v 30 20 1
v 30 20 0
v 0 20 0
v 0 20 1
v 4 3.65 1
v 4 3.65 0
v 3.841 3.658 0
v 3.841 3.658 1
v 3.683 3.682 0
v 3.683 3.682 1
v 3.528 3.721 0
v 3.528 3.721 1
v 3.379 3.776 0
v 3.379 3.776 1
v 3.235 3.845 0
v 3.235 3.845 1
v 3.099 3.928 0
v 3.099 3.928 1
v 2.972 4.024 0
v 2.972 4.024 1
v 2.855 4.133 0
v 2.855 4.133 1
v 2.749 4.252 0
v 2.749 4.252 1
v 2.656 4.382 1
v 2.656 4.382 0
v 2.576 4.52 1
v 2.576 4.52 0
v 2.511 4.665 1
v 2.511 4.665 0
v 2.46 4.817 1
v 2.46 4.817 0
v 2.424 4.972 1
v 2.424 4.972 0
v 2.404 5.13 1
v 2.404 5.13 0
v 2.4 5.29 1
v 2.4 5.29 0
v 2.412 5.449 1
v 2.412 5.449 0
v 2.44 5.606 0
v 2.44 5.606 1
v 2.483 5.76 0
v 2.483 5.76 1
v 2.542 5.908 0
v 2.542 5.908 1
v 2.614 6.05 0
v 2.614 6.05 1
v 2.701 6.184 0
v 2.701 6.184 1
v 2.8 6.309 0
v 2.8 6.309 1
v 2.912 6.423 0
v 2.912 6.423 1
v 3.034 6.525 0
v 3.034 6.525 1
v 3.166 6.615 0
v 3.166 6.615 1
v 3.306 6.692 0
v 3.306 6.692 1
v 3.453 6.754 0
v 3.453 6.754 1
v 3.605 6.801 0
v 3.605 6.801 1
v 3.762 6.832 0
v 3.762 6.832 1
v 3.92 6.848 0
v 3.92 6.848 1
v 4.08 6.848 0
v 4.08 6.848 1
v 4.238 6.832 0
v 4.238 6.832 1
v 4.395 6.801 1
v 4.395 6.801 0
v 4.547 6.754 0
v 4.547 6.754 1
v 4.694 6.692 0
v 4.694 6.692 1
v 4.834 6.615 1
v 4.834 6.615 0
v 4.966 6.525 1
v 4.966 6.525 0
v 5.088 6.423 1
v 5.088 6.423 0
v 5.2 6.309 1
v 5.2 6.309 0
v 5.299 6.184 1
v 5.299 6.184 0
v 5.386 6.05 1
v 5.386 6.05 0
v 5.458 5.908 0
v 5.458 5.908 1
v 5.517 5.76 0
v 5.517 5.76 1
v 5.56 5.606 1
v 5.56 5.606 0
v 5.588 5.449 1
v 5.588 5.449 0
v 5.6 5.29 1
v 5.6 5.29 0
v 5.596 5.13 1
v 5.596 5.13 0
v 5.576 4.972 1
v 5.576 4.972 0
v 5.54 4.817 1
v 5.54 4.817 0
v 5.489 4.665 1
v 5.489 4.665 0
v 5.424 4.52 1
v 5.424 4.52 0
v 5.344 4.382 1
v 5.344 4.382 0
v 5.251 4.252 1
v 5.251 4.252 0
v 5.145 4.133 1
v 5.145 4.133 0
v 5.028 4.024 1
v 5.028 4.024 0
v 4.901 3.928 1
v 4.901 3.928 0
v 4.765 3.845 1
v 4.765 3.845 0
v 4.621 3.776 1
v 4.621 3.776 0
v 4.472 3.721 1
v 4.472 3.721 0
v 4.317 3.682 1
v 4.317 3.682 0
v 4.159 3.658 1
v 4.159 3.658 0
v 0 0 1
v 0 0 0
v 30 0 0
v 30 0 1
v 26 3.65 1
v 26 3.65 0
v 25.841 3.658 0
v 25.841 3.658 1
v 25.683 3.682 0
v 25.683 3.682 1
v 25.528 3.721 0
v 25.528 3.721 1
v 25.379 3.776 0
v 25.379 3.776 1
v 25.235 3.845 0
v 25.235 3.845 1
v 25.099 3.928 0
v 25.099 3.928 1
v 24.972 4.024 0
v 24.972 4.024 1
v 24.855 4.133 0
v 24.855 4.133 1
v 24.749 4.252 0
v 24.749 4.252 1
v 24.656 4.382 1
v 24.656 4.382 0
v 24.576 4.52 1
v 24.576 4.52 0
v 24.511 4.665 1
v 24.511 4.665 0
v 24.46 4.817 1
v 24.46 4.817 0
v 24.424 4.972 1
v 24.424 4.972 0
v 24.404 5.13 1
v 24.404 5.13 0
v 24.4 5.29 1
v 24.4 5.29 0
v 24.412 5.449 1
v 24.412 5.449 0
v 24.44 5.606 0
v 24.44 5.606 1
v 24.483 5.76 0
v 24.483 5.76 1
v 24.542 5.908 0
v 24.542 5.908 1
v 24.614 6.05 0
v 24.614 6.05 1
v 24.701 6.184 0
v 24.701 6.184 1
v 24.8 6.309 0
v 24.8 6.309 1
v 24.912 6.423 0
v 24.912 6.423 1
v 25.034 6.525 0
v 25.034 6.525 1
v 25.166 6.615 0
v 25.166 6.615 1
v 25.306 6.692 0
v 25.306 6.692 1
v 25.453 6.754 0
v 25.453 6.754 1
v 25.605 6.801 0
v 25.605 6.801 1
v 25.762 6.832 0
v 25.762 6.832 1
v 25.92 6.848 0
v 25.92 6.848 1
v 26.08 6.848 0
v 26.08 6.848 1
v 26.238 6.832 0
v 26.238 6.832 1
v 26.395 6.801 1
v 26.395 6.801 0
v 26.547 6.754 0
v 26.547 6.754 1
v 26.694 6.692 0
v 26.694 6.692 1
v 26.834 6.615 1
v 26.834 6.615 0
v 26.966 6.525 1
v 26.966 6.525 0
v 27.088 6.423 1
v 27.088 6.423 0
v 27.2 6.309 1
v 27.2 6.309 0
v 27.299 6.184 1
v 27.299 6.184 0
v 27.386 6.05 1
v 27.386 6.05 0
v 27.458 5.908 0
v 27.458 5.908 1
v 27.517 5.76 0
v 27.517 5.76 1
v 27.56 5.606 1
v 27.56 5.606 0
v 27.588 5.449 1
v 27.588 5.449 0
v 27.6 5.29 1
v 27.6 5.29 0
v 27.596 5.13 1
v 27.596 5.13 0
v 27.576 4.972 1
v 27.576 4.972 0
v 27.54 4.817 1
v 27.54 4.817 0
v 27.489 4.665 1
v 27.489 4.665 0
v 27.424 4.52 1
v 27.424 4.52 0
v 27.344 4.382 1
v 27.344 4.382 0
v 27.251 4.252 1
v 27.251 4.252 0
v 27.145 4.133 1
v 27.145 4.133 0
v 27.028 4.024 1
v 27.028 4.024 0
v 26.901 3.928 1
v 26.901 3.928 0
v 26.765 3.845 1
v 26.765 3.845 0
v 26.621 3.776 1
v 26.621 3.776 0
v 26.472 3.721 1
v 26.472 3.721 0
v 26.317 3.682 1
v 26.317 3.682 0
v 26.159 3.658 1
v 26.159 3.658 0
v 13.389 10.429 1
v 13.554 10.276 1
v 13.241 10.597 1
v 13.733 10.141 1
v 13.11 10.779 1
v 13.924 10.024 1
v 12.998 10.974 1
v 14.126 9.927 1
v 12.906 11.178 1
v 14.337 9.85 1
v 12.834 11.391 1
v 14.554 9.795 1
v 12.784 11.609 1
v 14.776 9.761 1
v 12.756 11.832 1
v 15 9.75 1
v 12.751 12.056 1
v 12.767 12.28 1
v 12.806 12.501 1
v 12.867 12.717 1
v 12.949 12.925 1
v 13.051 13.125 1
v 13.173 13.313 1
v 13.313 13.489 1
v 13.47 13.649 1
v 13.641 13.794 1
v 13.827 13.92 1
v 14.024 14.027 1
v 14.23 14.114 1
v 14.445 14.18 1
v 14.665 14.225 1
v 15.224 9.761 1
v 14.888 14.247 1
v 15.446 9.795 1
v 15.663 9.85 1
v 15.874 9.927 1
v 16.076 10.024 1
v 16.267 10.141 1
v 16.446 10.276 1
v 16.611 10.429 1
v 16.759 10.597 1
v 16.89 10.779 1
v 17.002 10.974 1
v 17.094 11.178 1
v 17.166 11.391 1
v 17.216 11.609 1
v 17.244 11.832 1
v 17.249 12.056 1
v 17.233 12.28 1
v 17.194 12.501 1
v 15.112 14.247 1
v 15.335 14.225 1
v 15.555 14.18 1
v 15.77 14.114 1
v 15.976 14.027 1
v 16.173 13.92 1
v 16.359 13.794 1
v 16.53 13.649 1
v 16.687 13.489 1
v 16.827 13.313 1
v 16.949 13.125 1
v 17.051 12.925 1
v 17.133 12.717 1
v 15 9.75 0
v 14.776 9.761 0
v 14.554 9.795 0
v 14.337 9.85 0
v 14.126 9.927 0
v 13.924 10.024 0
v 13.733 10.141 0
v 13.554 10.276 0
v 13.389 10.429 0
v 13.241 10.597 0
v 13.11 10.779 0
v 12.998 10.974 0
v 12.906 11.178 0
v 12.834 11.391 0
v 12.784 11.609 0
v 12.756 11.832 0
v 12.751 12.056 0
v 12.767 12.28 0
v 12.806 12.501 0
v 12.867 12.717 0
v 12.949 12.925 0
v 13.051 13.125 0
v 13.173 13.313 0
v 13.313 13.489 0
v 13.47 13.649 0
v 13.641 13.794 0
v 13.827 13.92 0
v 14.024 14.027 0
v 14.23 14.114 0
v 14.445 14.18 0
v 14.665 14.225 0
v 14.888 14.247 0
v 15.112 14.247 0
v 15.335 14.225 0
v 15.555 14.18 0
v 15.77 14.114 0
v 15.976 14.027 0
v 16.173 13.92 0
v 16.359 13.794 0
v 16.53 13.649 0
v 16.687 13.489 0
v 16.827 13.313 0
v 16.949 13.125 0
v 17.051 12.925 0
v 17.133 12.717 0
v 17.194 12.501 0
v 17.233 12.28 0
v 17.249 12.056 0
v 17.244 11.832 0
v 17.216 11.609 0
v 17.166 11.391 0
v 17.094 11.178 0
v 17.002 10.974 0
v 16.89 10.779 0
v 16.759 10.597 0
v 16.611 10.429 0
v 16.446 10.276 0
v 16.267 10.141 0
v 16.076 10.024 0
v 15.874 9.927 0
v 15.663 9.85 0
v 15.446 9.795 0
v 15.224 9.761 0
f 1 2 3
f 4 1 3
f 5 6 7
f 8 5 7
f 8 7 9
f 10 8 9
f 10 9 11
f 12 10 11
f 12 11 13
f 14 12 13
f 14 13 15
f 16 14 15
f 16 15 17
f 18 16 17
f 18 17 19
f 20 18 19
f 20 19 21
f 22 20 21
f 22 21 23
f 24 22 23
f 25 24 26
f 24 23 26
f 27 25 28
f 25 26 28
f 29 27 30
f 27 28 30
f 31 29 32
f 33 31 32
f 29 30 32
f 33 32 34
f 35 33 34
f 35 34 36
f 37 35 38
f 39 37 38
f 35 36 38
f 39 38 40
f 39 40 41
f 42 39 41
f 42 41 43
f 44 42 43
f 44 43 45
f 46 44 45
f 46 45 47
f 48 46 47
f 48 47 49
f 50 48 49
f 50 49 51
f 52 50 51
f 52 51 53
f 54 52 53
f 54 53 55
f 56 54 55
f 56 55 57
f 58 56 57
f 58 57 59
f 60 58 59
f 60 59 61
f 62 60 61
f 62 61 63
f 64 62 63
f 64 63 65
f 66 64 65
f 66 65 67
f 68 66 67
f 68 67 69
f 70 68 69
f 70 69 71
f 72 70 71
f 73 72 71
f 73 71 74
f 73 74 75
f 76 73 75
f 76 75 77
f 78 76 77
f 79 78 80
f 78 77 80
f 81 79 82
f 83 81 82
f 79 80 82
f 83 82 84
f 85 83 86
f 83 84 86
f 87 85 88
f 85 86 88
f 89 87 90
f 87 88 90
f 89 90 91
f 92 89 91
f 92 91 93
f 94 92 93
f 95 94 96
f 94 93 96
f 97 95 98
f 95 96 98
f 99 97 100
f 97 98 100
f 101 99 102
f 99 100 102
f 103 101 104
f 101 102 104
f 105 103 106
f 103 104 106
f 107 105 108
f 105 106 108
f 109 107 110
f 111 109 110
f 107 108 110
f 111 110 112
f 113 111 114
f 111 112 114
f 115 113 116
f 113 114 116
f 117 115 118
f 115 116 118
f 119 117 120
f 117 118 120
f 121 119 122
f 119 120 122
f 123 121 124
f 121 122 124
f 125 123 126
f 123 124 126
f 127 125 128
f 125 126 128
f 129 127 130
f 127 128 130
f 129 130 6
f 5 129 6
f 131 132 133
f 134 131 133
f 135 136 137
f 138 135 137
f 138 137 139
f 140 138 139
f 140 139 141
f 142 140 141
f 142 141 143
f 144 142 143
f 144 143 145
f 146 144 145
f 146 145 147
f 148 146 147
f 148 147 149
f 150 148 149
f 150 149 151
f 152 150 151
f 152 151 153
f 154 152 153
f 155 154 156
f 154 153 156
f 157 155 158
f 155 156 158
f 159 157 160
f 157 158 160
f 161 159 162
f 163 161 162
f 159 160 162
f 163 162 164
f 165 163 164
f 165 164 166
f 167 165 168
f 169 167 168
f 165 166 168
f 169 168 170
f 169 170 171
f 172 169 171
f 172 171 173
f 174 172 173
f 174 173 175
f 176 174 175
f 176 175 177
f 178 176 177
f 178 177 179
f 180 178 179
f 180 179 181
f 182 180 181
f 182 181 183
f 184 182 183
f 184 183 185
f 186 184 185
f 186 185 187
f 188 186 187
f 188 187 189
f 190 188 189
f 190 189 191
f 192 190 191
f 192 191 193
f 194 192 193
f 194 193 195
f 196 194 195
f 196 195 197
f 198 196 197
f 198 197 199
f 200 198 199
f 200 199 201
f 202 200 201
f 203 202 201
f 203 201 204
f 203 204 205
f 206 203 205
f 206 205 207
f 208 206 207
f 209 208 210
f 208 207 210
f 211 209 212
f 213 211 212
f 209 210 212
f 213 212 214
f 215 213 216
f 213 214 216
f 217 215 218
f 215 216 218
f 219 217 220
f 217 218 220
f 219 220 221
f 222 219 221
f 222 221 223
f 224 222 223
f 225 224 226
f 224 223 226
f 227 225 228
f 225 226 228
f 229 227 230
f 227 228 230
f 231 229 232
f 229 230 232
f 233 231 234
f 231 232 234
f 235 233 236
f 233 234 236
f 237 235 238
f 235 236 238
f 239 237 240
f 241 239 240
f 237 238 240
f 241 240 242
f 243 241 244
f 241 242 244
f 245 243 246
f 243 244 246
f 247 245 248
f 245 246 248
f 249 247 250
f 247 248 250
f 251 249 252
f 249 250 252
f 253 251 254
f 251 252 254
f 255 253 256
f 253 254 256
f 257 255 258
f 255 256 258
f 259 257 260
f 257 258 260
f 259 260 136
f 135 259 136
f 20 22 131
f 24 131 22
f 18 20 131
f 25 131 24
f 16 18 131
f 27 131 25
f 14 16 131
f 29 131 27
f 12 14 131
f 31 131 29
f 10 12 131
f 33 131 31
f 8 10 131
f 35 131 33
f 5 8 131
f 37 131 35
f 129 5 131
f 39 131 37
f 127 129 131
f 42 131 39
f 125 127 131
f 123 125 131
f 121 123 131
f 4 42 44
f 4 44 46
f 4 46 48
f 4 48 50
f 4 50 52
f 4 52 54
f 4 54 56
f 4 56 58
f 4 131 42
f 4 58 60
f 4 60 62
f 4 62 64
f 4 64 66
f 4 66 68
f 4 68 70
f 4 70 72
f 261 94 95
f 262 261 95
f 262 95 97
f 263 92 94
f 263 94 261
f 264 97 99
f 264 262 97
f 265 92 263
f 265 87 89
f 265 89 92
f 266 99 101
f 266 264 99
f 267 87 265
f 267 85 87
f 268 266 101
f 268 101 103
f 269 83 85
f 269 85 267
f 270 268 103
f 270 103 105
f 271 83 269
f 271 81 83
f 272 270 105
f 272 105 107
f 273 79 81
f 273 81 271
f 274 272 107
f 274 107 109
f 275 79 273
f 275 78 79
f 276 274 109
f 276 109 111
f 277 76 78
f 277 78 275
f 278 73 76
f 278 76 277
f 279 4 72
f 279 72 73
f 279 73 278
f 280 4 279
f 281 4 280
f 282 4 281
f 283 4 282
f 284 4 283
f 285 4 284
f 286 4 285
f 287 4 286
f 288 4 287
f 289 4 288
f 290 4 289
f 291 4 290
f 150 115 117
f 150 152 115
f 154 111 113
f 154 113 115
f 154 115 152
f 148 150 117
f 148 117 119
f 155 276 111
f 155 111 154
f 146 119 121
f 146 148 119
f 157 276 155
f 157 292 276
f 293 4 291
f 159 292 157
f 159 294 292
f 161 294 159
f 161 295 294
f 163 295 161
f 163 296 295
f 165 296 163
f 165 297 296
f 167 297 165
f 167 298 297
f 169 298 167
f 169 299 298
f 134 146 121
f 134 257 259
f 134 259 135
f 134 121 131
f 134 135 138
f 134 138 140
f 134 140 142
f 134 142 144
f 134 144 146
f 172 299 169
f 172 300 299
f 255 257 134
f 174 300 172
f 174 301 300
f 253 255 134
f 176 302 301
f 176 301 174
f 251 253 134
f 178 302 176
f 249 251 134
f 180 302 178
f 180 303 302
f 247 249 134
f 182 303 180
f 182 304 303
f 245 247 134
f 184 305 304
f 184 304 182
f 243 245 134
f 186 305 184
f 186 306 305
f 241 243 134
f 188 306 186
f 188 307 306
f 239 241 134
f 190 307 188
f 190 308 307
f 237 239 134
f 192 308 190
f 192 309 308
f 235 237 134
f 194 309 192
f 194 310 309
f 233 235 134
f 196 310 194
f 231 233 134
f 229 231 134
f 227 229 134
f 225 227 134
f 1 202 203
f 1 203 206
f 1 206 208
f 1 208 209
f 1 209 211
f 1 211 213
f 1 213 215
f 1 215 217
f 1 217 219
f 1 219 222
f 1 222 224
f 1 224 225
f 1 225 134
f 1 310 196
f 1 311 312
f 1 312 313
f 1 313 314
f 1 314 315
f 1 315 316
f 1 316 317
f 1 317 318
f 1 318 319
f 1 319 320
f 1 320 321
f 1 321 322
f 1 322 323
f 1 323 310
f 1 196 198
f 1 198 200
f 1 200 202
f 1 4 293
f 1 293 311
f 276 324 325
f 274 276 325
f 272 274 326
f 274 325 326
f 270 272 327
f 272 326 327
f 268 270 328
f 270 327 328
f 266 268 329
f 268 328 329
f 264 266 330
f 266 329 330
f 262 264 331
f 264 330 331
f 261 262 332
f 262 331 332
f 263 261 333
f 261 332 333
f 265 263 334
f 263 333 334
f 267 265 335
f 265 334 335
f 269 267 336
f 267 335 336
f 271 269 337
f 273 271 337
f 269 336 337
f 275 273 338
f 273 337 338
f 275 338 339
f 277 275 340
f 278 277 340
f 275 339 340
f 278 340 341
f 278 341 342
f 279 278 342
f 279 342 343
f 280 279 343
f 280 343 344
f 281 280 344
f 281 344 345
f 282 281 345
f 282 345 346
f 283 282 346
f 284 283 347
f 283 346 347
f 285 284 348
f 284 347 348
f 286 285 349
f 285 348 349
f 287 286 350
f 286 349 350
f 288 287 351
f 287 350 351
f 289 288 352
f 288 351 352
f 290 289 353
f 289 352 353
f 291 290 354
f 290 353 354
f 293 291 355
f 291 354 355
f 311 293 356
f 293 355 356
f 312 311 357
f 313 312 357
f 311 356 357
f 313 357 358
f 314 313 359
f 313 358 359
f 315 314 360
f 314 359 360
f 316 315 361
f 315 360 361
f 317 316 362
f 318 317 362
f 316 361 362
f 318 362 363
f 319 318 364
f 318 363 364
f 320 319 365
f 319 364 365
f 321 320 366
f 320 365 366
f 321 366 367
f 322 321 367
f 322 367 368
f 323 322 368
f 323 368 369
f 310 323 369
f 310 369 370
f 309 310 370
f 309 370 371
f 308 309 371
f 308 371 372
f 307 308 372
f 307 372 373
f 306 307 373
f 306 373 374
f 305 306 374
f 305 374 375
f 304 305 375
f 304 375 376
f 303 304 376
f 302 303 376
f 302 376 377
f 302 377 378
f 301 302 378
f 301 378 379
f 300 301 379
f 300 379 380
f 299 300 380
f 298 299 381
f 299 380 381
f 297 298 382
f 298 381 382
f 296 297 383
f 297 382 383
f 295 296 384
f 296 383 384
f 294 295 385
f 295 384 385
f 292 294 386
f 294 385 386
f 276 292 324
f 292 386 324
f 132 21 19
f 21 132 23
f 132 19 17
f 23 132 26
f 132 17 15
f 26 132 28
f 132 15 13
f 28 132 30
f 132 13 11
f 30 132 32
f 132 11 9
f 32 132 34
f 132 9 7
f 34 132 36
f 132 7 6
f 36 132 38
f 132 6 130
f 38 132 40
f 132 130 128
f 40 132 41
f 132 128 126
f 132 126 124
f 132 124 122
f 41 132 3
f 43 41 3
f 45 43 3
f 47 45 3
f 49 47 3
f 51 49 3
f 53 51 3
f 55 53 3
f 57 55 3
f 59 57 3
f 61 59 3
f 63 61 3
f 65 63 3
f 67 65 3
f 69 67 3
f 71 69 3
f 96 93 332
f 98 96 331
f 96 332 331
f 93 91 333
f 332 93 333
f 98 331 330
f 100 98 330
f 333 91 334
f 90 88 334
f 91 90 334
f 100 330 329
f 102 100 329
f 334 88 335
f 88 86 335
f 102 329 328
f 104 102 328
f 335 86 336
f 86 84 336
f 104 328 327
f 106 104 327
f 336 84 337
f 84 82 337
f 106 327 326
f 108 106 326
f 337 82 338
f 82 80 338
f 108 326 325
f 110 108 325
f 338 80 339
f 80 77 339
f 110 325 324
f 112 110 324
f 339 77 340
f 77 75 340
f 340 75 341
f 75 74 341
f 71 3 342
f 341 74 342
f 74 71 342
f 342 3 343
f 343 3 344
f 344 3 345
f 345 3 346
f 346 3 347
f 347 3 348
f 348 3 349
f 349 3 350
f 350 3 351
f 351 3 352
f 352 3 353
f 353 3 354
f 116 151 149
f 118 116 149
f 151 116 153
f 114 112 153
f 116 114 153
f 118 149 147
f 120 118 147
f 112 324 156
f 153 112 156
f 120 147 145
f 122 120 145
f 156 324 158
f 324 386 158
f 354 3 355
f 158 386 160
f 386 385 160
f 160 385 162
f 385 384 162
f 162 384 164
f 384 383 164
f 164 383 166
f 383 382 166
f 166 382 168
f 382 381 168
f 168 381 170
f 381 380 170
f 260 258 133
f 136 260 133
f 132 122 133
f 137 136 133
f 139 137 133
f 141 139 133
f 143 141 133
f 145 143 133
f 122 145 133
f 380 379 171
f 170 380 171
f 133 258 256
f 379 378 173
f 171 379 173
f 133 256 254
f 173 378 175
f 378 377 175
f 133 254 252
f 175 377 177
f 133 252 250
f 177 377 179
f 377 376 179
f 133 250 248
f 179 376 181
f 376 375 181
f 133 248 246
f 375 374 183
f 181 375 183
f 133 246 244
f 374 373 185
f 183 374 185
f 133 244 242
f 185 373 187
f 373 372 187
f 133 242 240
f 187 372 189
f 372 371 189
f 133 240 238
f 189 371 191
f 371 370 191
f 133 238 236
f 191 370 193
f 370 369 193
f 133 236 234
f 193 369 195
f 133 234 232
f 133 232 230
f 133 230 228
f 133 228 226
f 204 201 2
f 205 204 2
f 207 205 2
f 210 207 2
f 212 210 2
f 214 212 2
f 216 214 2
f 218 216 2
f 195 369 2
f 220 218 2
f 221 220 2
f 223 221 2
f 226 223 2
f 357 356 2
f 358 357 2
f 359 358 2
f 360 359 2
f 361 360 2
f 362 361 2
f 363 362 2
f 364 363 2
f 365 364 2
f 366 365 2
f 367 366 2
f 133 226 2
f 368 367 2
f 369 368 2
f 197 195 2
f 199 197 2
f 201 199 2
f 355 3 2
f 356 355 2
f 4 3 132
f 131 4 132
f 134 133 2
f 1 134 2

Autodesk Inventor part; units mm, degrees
ref_plane "YZ Plane" through (0, 0, 0) normal (1, 0, 0) x (0, 1, 0)
ref_plane "XZ Plane" through (0, 0, 0) normal (0, 1, 0) x (-1, 0, 0)
ref_plane "XY Plane" through (0, 0, 0) normal (0, 0, 1) x (1, 0, 0)
sketch "スケッチ1" plane through (0, 0, 0) normal (0, 0, 1) x (1, 0, 0)
  line L0 (0, 0) -> (30, 0)
  line L1 (30, 0) -> (30, 20)
  line L2 (30, 20) -> (0, 20)
  line L3 (0, 20) -> (0, 0)
  dimension "d0" = 20
  dimension "d1" = 30
extrude "押し出し1" add sketch "スケッチ1" along normal blind 1
sketch "スケッチ2" plane through (0, 0, 1) normal (0, 0, 1) x (1, 0, 0)
  line L0 (30, 20) -> (0, 20) projected
  point P0 (0, 0)
  point P1 (15, 12)
  point P2 (15, 20)
  dimension "d4" = 8
hole "穴1" at (15, 12, 1) direction (0, 0, -1) diameter 4.5 end through all
sketch "スケッチ3" plane through (0, 0, 1) normal (0, 0, 1) x (1, 0, 0)
  line L0 (0, 20) -> (0, 0) projected
  line L1 (0, 0) -> (30, 0) projected
  line L2 (30, 20) -> (0, 20) projected
  point P0 (4, 5.25)
  point P1 (26, 5.25)
  dimension "d12" = 22
  dimension "d13" = 4
  dimension "d22" = 14.75
hole "穴2" at (4, 5.25, 1) at (26, 5.25, 1) direction (0, 0, -1) diameter 3.2 end through all
properties part number "CLS_typeC_31.4N_plate"
